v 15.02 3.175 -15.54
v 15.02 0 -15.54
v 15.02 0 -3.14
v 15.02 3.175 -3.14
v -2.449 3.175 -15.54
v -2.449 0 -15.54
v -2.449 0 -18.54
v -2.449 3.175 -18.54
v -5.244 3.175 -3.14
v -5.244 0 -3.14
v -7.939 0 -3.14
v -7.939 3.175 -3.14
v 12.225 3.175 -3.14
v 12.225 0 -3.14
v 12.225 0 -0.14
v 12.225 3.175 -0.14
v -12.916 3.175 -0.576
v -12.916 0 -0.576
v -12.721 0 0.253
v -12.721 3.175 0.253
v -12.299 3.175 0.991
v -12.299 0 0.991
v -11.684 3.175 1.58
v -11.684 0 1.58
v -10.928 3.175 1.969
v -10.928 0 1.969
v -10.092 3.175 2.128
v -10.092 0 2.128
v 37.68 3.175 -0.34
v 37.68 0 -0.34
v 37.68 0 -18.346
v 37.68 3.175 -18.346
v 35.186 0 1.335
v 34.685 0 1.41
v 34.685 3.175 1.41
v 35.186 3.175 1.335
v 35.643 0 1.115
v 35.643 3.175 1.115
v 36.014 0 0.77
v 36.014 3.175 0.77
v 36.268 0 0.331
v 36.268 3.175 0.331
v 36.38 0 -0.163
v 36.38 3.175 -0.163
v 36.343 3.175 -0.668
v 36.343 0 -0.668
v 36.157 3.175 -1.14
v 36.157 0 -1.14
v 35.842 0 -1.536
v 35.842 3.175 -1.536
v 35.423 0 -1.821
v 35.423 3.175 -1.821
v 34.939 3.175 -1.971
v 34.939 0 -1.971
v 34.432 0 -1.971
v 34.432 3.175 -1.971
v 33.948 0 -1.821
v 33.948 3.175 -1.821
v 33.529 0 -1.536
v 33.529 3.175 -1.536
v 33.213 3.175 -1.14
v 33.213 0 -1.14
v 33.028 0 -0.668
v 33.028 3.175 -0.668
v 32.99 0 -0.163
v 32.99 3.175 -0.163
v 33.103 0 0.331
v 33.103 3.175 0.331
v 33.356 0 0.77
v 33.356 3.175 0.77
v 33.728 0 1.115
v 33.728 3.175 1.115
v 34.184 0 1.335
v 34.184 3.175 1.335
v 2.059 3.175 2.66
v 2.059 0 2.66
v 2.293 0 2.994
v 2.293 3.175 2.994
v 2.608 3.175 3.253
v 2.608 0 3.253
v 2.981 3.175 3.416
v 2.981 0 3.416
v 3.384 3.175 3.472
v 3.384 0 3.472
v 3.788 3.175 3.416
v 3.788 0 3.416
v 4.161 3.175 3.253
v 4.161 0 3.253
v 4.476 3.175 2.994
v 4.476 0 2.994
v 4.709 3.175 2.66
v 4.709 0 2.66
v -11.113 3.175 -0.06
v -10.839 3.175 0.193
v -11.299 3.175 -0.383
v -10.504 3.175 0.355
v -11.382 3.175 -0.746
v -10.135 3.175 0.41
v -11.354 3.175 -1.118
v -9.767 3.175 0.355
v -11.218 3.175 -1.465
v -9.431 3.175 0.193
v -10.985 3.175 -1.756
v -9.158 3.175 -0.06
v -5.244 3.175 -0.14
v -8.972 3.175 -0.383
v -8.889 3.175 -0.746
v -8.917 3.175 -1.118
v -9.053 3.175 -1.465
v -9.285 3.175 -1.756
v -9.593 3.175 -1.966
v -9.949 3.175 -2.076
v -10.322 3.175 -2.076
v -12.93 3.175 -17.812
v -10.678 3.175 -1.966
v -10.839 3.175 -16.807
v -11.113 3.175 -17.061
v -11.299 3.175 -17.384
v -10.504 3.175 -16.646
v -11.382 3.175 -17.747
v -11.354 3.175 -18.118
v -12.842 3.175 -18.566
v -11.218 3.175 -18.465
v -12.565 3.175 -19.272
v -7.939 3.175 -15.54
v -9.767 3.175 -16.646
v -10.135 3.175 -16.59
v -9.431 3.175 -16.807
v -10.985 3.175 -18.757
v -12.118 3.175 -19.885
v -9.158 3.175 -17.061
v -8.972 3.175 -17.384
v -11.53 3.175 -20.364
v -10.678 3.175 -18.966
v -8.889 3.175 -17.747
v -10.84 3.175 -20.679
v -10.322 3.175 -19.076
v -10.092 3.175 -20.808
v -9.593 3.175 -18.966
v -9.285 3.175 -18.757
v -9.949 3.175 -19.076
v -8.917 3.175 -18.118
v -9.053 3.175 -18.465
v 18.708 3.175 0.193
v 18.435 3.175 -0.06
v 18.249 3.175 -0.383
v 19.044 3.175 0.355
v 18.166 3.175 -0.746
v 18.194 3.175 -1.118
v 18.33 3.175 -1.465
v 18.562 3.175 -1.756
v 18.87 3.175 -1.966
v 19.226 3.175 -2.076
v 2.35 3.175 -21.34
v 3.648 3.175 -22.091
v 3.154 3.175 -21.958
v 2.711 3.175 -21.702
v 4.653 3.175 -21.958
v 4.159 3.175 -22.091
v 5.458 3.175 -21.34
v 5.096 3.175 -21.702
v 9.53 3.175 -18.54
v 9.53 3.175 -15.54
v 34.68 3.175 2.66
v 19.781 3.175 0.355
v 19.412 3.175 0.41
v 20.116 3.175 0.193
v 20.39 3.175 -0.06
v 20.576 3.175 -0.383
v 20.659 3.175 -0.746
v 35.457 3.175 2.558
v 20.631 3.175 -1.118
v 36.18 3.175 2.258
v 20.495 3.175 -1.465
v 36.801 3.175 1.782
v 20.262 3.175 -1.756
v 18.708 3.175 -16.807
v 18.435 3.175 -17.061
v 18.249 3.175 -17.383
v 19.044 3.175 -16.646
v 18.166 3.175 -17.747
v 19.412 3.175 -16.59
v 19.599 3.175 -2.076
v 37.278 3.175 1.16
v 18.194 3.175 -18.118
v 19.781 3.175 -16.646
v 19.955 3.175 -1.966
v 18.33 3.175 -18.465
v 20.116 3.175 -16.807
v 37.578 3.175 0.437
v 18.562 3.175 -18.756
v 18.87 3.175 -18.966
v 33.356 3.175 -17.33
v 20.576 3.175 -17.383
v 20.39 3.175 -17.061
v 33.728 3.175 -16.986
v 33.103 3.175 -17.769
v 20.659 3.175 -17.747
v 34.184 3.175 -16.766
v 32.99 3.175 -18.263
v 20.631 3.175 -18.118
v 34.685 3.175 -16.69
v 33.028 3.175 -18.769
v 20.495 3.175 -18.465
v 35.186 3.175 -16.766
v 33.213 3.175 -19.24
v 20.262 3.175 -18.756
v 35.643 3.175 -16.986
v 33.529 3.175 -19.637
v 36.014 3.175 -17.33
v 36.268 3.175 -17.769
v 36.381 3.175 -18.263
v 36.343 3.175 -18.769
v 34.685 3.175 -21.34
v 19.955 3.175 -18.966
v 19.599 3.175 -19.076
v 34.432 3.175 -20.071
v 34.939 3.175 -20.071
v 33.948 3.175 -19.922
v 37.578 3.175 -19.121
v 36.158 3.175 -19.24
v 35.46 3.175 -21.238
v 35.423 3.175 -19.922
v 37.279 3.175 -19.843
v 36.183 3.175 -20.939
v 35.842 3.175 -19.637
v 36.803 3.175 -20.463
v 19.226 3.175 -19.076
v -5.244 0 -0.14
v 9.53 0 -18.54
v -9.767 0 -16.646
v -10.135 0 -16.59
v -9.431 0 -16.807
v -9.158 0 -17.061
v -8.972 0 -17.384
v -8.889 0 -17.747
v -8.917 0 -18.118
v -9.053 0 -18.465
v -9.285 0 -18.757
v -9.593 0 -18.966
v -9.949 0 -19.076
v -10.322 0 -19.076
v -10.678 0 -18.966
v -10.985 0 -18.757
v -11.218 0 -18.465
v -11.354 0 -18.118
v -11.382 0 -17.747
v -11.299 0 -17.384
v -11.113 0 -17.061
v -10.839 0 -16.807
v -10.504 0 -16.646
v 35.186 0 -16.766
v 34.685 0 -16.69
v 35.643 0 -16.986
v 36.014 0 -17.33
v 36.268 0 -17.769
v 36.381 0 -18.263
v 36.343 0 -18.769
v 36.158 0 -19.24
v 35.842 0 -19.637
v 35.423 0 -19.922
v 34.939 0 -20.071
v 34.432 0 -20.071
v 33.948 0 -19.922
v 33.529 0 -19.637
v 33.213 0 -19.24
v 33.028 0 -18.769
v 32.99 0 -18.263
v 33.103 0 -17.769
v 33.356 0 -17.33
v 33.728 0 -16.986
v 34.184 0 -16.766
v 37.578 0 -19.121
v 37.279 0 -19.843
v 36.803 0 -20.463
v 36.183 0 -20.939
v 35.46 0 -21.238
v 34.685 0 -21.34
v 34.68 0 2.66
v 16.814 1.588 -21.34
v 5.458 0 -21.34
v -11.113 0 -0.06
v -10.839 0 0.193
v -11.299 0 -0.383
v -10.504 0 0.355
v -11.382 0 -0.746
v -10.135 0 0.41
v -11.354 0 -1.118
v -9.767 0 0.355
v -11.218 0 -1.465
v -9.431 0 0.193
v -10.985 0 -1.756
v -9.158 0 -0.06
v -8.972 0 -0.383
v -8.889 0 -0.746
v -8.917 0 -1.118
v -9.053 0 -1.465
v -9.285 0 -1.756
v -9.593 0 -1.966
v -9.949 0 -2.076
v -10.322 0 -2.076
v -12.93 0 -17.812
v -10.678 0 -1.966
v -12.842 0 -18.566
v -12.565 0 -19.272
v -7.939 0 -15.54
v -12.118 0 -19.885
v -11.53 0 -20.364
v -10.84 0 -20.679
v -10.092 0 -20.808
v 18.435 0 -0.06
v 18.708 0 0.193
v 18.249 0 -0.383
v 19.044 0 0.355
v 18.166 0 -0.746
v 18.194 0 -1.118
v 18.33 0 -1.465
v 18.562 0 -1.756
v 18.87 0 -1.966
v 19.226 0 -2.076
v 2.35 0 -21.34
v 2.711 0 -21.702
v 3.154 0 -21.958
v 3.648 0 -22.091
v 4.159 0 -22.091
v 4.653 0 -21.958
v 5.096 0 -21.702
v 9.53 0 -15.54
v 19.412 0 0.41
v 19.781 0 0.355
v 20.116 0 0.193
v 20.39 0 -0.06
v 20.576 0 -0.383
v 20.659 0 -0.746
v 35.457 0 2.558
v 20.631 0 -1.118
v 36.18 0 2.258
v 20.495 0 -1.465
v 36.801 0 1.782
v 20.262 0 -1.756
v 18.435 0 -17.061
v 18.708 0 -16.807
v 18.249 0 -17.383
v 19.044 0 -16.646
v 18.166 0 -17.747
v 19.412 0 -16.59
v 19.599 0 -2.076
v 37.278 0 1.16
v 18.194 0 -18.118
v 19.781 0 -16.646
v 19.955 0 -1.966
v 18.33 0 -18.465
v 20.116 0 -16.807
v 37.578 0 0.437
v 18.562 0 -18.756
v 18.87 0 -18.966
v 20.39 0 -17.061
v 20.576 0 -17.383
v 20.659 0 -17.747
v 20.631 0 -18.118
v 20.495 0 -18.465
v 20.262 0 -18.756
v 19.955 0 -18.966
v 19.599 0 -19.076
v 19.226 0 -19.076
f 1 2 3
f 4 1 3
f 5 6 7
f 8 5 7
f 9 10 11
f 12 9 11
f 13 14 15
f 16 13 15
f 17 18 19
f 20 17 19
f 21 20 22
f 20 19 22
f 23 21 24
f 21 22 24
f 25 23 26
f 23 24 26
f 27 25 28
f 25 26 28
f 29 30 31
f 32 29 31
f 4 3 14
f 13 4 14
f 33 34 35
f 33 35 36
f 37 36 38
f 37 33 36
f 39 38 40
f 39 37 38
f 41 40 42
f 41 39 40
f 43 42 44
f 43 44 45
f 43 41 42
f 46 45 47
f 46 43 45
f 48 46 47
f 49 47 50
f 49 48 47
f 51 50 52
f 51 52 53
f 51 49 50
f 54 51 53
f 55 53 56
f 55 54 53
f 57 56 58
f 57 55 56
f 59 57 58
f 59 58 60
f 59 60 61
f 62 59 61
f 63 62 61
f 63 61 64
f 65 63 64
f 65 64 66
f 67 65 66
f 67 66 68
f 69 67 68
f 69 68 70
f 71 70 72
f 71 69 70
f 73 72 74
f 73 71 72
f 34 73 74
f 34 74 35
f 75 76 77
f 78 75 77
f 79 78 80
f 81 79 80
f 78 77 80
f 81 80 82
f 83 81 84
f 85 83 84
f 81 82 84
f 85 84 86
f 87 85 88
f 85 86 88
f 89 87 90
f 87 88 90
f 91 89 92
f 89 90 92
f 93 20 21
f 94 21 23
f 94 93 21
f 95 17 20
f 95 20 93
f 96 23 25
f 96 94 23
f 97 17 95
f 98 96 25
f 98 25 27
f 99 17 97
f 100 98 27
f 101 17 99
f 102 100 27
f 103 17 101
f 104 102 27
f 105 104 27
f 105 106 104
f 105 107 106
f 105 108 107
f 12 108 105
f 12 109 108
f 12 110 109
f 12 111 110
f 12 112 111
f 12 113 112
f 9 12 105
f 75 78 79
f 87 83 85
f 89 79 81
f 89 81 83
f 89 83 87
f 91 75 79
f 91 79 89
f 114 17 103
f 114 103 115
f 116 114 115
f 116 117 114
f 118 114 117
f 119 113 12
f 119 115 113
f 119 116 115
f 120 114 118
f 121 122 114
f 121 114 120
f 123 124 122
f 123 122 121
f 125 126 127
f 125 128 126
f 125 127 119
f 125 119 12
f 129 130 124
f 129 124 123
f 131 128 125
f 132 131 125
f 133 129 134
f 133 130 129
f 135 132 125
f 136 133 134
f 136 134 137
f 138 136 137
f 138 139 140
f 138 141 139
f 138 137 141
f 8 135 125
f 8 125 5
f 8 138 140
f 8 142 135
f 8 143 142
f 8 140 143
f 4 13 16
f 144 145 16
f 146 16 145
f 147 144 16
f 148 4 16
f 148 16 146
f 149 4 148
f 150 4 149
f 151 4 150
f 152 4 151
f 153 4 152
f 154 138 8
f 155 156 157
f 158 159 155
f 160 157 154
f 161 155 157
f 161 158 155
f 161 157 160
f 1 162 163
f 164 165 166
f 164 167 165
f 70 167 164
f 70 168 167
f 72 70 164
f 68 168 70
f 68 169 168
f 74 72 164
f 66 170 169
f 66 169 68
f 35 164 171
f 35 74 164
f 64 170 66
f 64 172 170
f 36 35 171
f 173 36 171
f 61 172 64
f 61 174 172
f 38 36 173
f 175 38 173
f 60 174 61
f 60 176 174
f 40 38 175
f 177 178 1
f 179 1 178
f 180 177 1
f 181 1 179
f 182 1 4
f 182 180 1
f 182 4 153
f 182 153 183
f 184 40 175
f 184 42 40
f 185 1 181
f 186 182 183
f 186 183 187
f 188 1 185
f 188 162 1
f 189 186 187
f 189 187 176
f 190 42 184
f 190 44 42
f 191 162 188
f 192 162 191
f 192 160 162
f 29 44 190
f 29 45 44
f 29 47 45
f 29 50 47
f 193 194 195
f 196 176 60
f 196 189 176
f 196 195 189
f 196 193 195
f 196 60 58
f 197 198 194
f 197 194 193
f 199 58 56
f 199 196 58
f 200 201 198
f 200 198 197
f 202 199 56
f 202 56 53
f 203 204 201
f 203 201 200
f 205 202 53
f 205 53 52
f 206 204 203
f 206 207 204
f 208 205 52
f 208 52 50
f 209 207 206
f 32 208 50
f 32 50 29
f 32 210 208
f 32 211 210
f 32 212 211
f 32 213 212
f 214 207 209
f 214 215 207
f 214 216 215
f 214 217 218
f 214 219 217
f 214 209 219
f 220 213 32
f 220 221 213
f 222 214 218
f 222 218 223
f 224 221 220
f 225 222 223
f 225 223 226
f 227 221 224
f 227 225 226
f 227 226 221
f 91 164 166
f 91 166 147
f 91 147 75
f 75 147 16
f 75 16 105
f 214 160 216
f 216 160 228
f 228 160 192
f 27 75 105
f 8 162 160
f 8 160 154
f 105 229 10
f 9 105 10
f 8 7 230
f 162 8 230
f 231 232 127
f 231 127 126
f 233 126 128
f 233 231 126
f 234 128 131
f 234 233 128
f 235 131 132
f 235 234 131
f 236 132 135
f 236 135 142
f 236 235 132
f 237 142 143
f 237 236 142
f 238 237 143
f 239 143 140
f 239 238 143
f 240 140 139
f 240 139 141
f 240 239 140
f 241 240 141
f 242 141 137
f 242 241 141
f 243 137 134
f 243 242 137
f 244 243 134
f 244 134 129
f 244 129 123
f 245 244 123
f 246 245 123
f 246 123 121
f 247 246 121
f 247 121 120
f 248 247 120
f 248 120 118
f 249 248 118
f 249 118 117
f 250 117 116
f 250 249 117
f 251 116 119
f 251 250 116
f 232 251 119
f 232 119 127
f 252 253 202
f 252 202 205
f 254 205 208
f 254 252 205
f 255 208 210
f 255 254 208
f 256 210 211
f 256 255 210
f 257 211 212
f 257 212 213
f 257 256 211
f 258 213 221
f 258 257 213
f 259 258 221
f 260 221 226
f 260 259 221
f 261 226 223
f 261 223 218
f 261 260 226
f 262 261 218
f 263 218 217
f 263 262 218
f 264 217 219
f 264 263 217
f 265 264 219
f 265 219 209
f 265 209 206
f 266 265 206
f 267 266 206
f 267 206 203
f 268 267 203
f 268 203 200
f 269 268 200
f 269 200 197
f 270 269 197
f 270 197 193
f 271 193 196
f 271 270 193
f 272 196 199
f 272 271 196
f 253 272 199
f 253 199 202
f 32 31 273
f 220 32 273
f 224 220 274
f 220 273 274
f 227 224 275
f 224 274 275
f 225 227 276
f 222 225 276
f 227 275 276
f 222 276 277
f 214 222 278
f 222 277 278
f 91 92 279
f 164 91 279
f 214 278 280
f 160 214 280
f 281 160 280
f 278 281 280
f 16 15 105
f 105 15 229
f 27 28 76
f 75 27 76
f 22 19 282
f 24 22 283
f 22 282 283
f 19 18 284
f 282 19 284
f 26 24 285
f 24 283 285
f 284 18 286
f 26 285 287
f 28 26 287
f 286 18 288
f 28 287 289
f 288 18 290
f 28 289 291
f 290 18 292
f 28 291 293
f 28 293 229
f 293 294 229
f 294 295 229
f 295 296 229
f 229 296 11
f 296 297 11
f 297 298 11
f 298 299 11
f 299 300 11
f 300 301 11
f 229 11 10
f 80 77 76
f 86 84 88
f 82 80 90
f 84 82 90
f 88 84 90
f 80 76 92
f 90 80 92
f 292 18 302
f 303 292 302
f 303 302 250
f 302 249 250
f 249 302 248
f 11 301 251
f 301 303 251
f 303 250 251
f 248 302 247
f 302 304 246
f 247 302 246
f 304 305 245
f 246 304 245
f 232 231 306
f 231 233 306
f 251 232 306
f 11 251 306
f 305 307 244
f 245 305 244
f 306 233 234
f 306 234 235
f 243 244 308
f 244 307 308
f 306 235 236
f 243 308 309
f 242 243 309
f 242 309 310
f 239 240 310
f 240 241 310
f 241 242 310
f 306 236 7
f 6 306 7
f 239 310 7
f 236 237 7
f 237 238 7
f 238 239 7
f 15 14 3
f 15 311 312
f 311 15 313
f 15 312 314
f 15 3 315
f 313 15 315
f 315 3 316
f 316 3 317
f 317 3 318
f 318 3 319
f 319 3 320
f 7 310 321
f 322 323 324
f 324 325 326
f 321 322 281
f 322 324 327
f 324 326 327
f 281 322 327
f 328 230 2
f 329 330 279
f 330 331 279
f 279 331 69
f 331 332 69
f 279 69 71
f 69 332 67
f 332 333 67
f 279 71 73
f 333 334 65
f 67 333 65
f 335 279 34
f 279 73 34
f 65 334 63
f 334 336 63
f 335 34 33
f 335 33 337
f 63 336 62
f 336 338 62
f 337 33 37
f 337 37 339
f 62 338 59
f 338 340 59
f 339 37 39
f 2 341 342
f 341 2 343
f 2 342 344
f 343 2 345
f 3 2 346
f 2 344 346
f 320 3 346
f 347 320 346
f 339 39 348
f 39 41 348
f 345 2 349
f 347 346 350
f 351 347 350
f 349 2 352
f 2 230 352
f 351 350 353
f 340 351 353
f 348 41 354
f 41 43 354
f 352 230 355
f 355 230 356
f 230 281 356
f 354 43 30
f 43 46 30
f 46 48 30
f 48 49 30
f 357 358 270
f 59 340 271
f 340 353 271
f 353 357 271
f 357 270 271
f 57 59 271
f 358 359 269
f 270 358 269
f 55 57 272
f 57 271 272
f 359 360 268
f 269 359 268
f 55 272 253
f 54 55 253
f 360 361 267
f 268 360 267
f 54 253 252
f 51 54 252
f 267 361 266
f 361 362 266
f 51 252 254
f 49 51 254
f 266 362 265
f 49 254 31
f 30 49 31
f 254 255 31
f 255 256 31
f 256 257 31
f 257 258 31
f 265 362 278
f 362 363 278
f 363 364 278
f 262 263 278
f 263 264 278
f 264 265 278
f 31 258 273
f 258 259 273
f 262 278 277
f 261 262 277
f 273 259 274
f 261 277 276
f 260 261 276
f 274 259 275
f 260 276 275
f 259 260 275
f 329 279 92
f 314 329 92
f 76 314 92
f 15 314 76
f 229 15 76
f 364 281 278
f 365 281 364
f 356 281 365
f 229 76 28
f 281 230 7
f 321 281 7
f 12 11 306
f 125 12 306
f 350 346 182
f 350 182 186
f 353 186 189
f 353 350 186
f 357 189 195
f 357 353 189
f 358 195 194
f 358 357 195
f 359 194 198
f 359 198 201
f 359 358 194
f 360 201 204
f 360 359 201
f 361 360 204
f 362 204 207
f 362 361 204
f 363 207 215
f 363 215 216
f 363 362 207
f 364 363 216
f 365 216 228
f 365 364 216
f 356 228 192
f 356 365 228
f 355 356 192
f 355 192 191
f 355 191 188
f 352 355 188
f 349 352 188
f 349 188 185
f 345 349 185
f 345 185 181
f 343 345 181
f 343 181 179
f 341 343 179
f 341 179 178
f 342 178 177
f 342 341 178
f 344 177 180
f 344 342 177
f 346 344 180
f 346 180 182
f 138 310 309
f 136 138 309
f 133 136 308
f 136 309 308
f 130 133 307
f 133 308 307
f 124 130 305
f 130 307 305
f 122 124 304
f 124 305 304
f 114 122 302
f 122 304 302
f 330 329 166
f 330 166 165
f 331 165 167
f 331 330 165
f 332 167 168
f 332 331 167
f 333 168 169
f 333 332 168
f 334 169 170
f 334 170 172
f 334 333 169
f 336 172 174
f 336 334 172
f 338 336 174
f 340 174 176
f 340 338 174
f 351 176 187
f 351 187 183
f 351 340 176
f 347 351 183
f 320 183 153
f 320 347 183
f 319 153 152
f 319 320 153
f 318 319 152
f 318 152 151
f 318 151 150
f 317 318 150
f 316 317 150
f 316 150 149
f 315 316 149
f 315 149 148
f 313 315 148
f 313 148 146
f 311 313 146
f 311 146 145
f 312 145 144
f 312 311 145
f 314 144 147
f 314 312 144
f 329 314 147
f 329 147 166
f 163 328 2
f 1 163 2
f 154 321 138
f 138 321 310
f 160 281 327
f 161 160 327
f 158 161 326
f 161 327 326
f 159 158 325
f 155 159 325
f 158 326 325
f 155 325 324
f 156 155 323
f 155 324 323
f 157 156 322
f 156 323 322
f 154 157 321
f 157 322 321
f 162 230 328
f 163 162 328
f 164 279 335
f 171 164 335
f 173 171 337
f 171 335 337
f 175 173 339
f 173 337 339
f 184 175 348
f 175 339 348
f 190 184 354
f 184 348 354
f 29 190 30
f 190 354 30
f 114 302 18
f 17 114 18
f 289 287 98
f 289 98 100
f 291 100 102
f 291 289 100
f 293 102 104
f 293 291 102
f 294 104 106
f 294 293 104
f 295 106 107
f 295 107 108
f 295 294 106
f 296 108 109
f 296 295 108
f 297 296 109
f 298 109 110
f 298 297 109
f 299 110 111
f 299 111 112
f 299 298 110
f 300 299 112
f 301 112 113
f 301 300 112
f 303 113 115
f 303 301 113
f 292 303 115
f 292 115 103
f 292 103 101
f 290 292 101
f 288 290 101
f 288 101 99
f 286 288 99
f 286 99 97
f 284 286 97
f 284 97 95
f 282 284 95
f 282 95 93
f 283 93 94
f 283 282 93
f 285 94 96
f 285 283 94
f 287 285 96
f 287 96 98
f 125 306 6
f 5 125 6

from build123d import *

# Parameters (mm, degrees)
SKETCH1_R           = 1.25
SKETCH1_R_2         = 1.7
BOSS_EXTRUDE1_DEPTH = 3.175


with BuildPart() as part:
    # Sketch1 → Boss-Extrude1 (new body)
    with BuildSketch(Plane(origin=(0, 0, 0), x_dir=(1, 0, 0), z_dir=(0, 1, 0))):
        with BuildLine():
            Line((4.709206507, -2.660218653), (34.68016435, -2.660218653))
            ThreePointArc((34.68016435, -2.660218653), (36.801406663, -1.781571318), (37.680053998, 0.339670996))
            Line((37.680053998, 0.339670996), (37.680053998, 18.345692352))
            ThreePointArc((37.680053998, 18.345692352), (36.802919812, 20.463281602), (34.685330562, 21.340415789))
            add(Edge.make_bspline(
                [(34.685330562, 21.340415789), (13.555998876, 21.34041579), (5.457536405, 21.34041579)],
                knots=[8, 8, 8, 9, 9, 9], degree=2))
            ThreePointArc((5.457536405, 21.34041579), (3.903764208, 22.107666003), (2.349992011, 21.34041579))
            Line((2.349992011, 21.34041579), (-10.092264133, 20.808084054))
            ThreePointArc((-10.092264133, 20.808084054), (-12.117989286, 19.884860301), (-12.930141677, 17.812105374))
            Line((-12.930141677, 17.812105374), (-12.916142632, 0.575581301))
            ThreePointArc((-12.916142632, 0.575581301), (-12.012905856, -1.307536184), (-10.092264134, -2.127965046))
            Line((-10.092264134, -2.127965046), (2.059487443, -2.660218653))
            ThreePointArc((2.059487443, -2.660218653), (3.384346975, -3.471607461), (4.709206507, -2.660218653))
        make_face()
        with Locations(Location((-10.13526538, 17.840261618, 0), (0, 0, 270))):
            Circle(SKETCH1_R, mode=Mode.SUBTRACT)
        with Locations(Location((-10.13526538, 0.839730428, 0), (0, 0, 270))):
            Circle(SKETCH1_R, mode=Mode.SUBTRACT)
        with Locations(Location((19.41222808, 0.839632764, 0), (0, 0, 270))):
            Circle(SKETCH1_R, mode=Mode.SUBTRACT)
        with Locations(Location((19.412228081, 17.840168837, 0), (0, 0, 270))):
            Circle(SKETCH1_R, mode=Mode.SUBTRACT)
        with Locations(Location((34.685233075, 0.289707036, 0), (0, 0, 270))):
            Circle(SKETCH1_R_2, mode=Mode.SUBTRACT)
        with Locations(Location((34.685264759, 18.390319188, 0), (0, 0, 270))):
            Circle(SKETCH1_R_2, mode=Mode.SUBTRACT)
        Polygon((12.275095957, 3.139860204), (12.225070816, 3.139860204), (12.225070816, 0.139779677), (-5.243817542, 0.139779677), (-5.243817542, 3.139860204), (-7.938965263, 3.139860204), (-7.938965263, 15.540268571), (-2.448882753, 15.540268571), (-2.448882753, 18.540349097), (9.530118068, 18.540349097), (9.530118068, 15.540268571), (15.020200579, 15.540268571), (15.020200579, 3.139860204), align=None, mode=Mode.SUBTRACT)
    extrude(amount=BOSS_EXTRUDE1_DEPTH)


solid = part.part
